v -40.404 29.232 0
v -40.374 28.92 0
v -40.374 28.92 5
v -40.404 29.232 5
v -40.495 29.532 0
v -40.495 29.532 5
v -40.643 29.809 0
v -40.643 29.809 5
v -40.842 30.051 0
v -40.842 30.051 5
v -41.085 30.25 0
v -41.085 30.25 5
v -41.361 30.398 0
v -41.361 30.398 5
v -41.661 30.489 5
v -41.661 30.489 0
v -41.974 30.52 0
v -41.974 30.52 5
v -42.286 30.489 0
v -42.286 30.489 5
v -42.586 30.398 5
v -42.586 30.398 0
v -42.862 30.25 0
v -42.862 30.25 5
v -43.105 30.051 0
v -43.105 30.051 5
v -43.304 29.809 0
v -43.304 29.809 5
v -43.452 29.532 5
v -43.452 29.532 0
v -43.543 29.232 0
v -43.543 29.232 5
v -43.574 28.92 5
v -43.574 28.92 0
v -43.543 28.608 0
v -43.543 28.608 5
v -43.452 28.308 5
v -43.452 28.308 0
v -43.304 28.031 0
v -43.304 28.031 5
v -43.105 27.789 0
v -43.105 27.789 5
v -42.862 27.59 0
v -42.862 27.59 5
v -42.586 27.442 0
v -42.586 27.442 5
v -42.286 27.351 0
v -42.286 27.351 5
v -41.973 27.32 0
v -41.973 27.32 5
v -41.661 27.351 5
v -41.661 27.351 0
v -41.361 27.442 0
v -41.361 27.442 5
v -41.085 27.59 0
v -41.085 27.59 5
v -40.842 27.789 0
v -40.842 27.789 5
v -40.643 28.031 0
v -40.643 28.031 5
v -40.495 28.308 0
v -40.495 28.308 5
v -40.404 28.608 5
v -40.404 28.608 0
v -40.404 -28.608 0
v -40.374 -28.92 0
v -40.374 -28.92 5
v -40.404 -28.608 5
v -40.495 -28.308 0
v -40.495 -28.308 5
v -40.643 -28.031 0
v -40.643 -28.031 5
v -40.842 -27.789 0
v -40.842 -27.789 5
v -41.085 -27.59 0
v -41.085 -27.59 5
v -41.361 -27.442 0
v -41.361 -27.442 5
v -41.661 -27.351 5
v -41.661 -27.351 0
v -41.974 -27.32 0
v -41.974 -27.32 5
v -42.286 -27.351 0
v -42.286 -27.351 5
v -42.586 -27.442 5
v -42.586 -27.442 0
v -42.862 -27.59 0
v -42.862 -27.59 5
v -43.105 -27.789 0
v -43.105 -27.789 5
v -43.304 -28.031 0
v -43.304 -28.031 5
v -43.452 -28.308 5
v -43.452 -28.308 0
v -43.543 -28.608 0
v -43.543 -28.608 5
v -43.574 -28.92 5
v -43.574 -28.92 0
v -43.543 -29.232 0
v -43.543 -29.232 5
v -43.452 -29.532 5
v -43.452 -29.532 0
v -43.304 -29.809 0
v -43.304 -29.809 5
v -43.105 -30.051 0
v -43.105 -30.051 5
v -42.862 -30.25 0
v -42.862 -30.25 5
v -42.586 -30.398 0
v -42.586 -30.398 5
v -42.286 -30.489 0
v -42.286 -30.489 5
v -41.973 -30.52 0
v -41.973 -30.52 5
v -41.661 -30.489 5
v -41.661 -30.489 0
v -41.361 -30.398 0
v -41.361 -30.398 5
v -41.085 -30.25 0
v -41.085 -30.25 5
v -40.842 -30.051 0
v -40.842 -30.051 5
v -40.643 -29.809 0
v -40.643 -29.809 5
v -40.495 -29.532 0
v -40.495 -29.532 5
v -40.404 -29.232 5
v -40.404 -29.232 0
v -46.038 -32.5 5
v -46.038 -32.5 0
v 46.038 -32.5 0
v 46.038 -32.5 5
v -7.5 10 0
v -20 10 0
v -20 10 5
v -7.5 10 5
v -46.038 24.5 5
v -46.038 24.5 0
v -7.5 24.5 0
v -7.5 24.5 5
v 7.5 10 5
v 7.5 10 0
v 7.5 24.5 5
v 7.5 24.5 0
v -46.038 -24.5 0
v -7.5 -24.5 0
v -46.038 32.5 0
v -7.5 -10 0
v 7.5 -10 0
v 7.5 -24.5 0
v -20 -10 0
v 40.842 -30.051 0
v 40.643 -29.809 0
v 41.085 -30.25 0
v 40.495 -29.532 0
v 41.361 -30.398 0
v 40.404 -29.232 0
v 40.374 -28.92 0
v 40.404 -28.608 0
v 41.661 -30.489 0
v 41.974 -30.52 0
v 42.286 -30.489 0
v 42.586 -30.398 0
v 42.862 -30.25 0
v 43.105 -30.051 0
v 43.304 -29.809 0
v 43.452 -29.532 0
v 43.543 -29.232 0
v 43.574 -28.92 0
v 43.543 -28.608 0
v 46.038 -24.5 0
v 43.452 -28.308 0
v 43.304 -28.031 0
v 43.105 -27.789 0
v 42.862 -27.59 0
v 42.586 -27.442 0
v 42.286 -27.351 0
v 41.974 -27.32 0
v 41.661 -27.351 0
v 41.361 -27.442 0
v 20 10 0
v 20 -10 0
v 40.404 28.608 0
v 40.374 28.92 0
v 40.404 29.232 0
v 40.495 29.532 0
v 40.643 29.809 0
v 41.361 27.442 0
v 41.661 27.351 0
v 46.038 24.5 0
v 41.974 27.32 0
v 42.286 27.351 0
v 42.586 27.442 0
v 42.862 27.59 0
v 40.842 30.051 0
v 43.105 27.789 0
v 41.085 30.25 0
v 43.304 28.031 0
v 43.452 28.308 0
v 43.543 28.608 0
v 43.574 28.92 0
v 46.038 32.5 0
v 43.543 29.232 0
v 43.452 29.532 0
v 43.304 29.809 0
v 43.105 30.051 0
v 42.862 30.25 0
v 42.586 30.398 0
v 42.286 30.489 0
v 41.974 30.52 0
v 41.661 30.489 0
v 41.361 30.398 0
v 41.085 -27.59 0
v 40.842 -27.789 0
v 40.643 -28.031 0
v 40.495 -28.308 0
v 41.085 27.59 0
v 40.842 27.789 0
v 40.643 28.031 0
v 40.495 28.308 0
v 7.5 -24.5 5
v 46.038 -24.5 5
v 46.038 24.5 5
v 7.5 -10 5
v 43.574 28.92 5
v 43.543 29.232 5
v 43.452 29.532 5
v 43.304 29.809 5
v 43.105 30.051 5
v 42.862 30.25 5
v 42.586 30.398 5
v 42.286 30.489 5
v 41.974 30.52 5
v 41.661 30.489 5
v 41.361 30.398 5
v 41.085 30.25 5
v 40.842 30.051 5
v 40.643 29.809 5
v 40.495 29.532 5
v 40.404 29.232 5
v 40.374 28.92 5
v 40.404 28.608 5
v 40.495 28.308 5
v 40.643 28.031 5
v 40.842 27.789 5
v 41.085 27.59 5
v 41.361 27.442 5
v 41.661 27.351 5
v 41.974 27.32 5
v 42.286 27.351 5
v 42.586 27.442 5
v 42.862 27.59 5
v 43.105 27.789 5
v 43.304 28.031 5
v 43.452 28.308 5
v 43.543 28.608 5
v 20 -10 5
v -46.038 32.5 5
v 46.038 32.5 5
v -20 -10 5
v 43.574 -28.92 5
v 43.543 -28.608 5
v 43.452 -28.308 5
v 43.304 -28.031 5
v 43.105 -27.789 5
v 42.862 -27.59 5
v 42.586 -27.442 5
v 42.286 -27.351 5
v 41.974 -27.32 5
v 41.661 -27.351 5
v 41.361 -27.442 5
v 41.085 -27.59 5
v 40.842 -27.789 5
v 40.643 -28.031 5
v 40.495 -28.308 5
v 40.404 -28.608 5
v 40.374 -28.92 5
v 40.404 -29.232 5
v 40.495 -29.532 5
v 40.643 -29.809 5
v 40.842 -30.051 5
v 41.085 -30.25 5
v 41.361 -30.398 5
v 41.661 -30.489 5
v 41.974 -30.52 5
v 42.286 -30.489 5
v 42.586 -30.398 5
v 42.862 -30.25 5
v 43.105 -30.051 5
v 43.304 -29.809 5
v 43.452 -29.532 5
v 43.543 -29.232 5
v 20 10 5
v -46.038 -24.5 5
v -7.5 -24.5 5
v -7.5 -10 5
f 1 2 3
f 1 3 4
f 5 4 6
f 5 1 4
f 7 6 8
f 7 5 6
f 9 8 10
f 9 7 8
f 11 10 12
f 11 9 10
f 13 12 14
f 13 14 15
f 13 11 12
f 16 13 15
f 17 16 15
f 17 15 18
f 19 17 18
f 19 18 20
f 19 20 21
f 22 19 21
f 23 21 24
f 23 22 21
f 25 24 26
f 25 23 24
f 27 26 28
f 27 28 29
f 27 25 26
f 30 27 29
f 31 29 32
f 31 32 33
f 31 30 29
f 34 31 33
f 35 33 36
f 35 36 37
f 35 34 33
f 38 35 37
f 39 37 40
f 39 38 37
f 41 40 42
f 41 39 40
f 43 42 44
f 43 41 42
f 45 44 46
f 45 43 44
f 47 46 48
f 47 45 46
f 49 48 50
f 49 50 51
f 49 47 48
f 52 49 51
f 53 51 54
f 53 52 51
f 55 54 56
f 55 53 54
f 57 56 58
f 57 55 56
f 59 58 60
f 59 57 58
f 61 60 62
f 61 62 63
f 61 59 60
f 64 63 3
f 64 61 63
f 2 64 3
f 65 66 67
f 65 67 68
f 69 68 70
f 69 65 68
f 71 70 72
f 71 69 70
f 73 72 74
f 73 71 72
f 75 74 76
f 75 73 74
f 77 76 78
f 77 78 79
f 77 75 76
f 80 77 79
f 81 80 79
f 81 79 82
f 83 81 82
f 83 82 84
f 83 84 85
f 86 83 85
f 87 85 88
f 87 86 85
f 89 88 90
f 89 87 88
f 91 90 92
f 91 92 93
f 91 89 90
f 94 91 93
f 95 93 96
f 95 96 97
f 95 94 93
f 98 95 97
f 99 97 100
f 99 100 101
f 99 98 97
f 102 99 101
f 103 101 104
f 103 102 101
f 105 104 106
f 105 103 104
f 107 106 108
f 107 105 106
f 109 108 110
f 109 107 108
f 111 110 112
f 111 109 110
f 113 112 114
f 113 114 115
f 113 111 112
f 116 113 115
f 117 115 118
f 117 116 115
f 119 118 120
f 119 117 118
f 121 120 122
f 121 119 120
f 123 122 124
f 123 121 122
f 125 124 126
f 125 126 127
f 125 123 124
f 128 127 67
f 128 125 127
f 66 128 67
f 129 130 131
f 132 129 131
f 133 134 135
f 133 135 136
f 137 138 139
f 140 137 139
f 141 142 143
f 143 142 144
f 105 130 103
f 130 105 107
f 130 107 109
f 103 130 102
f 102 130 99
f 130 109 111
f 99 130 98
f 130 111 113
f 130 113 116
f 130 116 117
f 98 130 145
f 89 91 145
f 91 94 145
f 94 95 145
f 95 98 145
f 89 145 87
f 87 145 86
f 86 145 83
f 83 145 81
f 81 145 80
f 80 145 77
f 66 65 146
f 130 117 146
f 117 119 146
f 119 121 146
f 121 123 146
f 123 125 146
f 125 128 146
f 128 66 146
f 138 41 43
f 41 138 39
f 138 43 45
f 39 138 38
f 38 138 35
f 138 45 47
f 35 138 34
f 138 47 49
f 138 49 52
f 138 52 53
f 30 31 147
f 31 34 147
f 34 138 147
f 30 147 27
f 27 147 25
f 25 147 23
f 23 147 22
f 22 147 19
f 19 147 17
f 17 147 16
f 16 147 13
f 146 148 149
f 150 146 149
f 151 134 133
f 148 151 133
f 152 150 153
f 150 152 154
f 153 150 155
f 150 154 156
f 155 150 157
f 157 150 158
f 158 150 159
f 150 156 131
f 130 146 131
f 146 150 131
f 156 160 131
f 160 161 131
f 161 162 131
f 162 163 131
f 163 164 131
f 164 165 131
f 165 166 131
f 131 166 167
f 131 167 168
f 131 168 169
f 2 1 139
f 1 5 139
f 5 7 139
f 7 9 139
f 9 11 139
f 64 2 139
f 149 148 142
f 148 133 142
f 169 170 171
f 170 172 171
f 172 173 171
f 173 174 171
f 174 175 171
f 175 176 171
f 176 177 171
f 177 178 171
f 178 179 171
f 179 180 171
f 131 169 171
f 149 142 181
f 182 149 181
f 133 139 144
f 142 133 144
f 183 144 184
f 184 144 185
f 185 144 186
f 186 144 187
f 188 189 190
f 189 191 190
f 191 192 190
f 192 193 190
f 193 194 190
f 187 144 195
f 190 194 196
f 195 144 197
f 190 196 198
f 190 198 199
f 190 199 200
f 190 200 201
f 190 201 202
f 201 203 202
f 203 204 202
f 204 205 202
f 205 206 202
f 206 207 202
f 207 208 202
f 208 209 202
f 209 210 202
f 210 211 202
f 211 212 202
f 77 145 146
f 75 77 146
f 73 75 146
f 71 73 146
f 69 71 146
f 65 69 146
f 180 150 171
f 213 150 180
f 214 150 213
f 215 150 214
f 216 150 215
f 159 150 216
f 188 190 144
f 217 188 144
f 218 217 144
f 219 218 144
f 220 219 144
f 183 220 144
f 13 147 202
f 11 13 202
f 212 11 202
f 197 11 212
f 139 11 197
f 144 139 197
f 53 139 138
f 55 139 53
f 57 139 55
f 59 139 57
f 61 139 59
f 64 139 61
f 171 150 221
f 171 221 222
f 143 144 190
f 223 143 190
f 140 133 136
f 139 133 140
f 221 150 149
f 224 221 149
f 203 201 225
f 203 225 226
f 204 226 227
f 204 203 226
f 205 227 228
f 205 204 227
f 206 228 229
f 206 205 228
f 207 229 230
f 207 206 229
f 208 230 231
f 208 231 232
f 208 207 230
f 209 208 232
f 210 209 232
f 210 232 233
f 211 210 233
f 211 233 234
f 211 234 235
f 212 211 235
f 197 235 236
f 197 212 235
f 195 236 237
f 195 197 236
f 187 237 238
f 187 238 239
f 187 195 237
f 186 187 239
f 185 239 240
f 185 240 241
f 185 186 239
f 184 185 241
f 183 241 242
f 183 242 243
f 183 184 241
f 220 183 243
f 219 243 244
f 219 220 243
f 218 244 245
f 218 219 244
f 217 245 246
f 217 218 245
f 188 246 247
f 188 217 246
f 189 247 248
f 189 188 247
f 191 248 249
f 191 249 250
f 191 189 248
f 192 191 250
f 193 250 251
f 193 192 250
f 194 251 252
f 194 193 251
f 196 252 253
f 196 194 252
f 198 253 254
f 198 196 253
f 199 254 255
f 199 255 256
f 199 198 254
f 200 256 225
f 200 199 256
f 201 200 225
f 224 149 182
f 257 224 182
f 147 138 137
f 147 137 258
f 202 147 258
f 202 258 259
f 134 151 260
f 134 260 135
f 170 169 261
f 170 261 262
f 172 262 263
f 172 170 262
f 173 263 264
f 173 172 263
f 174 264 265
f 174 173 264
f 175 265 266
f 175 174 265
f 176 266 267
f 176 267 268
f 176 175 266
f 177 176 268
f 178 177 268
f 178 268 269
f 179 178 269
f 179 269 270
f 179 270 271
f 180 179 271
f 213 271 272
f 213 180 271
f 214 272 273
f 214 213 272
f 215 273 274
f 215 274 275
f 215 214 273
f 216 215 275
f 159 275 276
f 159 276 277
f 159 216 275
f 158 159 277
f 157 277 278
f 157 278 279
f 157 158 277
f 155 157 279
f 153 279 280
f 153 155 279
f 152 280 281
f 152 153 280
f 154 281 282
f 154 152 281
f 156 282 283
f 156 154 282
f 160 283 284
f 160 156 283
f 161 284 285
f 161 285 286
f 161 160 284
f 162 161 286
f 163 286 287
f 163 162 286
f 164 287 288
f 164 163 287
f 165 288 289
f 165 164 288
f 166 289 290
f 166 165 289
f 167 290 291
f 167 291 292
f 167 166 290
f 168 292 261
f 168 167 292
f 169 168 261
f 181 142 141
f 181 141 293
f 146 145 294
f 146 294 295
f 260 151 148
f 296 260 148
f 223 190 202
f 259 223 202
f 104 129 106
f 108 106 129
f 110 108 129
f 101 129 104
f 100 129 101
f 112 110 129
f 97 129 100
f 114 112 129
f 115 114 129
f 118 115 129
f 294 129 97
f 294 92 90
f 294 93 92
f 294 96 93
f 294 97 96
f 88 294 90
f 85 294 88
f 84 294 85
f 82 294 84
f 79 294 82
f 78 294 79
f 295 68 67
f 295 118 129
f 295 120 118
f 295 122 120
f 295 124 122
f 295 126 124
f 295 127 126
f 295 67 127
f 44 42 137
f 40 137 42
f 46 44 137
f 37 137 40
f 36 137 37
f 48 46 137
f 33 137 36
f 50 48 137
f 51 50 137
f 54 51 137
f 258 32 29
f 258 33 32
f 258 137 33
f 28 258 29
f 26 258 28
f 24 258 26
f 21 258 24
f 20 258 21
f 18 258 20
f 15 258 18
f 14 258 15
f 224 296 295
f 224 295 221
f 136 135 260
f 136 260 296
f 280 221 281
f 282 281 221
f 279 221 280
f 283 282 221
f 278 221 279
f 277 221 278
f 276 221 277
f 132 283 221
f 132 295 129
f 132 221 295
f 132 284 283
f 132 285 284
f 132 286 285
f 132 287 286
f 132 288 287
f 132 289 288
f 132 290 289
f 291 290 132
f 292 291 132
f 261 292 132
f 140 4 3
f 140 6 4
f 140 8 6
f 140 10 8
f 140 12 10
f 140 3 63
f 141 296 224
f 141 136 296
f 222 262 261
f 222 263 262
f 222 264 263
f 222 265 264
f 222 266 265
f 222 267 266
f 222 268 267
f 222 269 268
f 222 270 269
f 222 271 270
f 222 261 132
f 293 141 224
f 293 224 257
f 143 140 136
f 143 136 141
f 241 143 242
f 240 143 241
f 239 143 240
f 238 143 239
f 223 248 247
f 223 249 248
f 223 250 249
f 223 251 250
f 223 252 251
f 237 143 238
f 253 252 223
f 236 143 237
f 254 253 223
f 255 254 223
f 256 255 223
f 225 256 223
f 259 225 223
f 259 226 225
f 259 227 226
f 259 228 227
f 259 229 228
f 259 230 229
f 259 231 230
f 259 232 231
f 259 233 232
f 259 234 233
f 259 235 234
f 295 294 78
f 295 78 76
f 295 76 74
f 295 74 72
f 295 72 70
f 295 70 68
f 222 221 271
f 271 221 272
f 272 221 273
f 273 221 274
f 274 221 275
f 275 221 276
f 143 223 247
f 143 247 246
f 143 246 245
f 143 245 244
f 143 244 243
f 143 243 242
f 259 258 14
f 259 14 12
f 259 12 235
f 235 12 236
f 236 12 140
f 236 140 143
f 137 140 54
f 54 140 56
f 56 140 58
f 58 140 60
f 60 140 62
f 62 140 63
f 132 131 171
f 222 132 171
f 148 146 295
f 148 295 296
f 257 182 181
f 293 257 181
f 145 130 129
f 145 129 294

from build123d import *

# Parameters (mm, degrees)
SKETCH_1_W      = 92.075
SKETCH_1_H      = 8
SKETCH_1_R      = 1.6
SKETCH_1_W_2    = 12.5
SKETCH_1_H_2    = 20
SKETCH_1_W_3    = 15
SKETCH_1_H_3    = 14.5
EXTRUDE_1_DEPTH = 5


with BuildPart() as part:
    # 草图1 → 凸台-拉伸1 (new body)
    # profile 1 of 7: a face of its own
    with BuildSketch(Plane.XY):
        with Locations((0, 28.5)):
            Rectangle(SKETCH_1_W, SKETCH_1_H)
        with Locations((41.9735, 28.92)):
            Circle(SKETCH_1_R, mode=Mode.SUBTRACT)
        with Locations((-41.9735, 28.92)):
            Circle(SKETCH_1_R, mode=Mode.SUBTRACT)
    # profile 2 of 7: a face of its own
    with BuildSketch(Plane.XY):
        with Locations((13.75, 0)):
            Rectangle(SKETCH_1_W_2, SKETCH_1_H_2)
    # profile 3 of 7: a face of its own
    with BuildSketch(Plane.XY):
        Rectangle(SKETCH_1_W_3, SKETCH_1_H_2)
    # profile 4 of 7: a face of its own
    with BuildSketch(Plane.XY):
        with Locations((-13.75, 0)):
            Rectangle(SKETCH_1_W_2, SKETCH_1_H_2)
    # profile 5 of 7: a face of its own
    with BuildSketch(Plane.XY):
        with Locations((0, 17.25)):
            Rectangle(SKETCH_1_W_3, SKETCH_1_H_3)
    # profile 6 of 7: a face of its own
    with BuildSketch(Plane.XY):
        with Locations((0, -28.5)):
            Rectangle(SKETCH_1_W, SKETCH_1_H)
        with Locations((-41.9735, -28.92)):
            Circle(SKETCH_1_R, mode=Mode.SUBTRACT)
        with Locations((41.9735, -28.92)):
            Circle(SKETCH_1_R, mode=Mode.SUBTRACT)
    # profile 7 of 7: a face of its own
    with BuildSketch(Plane.XY):
        with Locations((0, -17.25)):
            Rectangle(SKETCH_1_W_3, SKETCH_1_H_3)
    extrude(amount=EXTRUDE_1_DEPTH)


solid = part.part
